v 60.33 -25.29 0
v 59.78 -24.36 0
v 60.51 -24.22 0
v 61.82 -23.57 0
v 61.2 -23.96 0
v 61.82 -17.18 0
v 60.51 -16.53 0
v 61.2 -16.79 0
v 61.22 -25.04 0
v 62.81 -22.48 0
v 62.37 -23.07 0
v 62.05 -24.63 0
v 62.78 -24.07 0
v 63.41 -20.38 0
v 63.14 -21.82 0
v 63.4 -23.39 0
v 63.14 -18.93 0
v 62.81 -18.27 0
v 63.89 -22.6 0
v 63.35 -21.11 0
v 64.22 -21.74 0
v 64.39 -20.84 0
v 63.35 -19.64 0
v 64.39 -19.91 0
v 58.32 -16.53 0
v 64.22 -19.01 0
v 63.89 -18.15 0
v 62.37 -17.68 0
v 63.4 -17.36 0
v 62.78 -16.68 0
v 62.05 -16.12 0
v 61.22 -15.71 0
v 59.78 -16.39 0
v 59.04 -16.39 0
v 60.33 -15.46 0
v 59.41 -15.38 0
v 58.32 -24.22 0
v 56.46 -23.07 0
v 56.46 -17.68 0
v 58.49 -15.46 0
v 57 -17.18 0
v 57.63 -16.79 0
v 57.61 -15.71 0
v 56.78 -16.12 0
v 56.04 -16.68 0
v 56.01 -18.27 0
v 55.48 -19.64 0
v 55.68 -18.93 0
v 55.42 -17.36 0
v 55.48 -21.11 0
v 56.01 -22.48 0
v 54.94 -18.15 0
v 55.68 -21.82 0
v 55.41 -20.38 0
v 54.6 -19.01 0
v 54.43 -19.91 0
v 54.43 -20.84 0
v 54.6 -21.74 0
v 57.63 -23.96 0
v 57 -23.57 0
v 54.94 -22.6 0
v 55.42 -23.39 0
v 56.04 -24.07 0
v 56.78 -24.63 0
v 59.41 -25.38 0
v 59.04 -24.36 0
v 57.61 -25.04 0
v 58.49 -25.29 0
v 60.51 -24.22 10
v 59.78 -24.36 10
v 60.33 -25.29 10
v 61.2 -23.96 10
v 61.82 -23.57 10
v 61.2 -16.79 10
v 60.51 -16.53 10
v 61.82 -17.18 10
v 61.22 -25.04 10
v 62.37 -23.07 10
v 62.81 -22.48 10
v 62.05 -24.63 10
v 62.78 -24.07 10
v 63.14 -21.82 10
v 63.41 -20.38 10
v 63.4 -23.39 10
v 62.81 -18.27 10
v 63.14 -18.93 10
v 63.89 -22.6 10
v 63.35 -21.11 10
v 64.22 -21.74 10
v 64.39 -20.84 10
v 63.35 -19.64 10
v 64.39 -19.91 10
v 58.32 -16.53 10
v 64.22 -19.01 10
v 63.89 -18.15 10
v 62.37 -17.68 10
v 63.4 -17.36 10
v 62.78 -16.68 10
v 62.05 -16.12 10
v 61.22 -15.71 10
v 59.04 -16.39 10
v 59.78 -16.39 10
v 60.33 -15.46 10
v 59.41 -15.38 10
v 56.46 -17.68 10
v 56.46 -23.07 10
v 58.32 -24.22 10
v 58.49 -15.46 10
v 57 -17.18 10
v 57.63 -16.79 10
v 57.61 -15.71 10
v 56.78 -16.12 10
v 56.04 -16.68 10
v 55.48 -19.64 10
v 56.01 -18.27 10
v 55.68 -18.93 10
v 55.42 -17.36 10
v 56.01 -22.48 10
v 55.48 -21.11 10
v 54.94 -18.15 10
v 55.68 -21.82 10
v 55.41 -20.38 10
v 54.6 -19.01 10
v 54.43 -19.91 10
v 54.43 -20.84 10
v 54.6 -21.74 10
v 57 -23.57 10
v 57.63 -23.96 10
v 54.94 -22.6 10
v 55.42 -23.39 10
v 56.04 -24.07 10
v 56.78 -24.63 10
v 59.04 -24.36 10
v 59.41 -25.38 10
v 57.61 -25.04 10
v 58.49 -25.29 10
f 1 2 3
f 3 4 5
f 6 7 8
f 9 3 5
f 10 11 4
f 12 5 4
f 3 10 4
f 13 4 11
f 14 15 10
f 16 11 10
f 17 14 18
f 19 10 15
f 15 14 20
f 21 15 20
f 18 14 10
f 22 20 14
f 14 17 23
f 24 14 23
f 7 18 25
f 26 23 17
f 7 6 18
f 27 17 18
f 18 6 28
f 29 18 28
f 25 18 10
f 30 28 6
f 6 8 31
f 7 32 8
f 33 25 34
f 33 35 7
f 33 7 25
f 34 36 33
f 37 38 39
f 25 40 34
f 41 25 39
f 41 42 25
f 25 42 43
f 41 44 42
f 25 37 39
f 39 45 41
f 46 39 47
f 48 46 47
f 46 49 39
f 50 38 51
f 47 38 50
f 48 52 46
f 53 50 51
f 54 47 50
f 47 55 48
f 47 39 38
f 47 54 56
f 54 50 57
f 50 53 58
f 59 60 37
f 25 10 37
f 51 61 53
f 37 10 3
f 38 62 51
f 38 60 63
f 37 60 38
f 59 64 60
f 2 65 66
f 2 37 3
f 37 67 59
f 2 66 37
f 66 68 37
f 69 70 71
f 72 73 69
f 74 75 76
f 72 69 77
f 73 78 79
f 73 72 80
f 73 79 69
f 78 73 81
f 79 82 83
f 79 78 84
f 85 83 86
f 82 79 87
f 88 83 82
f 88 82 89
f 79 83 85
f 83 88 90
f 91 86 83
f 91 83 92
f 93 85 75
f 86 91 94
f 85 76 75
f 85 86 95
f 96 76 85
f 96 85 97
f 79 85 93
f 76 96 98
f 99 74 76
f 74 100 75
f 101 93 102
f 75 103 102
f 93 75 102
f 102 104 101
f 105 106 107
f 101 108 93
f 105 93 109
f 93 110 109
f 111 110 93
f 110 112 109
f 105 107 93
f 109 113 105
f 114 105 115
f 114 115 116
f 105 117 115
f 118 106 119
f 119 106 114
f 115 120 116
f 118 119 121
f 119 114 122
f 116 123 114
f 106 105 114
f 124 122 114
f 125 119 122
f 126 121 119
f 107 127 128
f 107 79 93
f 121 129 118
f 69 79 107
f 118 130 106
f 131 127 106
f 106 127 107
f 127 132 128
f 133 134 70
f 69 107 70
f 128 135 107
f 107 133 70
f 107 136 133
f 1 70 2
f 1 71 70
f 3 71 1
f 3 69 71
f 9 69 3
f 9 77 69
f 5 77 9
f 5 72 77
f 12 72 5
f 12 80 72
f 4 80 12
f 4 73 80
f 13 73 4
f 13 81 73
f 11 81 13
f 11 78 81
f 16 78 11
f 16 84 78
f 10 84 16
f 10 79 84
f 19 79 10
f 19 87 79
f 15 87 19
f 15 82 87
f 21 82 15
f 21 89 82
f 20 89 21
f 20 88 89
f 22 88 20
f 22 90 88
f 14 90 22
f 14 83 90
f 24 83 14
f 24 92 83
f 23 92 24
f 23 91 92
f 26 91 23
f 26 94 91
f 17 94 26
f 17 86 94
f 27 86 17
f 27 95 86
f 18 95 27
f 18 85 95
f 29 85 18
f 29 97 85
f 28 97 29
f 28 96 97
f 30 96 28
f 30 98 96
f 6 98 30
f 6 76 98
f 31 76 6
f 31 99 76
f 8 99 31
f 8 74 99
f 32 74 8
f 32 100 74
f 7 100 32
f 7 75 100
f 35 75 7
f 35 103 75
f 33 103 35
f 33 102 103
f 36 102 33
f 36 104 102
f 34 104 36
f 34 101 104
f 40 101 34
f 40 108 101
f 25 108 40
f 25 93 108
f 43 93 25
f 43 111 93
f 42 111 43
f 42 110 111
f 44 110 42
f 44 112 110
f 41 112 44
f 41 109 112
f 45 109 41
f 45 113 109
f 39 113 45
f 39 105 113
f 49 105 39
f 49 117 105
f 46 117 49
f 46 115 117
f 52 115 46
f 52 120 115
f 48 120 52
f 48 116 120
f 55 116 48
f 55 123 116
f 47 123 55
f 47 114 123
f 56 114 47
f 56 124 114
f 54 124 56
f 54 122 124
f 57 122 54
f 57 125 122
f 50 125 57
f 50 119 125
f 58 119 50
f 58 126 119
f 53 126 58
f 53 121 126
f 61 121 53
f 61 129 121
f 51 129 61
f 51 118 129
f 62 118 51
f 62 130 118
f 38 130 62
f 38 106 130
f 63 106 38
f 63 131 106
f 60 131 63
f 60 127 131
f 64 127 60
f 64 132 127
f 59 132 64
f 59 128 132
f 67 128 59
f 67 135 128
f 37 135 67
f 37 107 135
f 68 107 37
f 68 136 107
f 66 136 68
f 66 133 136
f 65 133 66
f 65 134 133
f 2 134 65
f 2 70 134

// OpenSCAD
linear_extrude(height = 10, center = false) {

polygon(points=[[59.41,-15.38],[59.78,-16.39],[60.33,-15.46],[60.51,-16.53],[61.22,-15.71],[61.2,-16.79],[62.05,-16.12],[61.82,-17.18],[62.78,-16.68],[62.37,-17.68],[63.4,-17.36],[62.81,-18.27],[63.89,-18.15],[63.14,-18.93],[64.22,-19.01],[63.35,-19.64],[64.39,-19.91],[63.41,-20.38],[64.39,-20.84],[63.35,-21.11],[64.22,-21.74],[63.14,-21.82],[63.89,-22.6],[62.81,-22.48],[63.4,-23.39],[62.37,-23.07],[62.78,-24.07],[61.82,-23.57],[62.05,-24.63],[61.2,-23.96],[61.22,-25.04],[60.51,-24.22],[60.33,-25.29],[59.78,-24.36],[59.41,-25.38],[59.04,-24.36],[58.49,-25.29],[58.32,-24.22],[57.61,-25.04],[57.63,-23.96],[56.78,-24.63],[57,-23.57],[56.04,-24.07],[56.46,-23.07],[55.42,-23.39],[56.01,-22.48],[54.94,-22.6],[55.68,-21.82],[54.6,-21.74],[55.48,-21.11],[54.43,-20.84],[55.41,-20.38],[54.43,-19.91],[55.48,-19.64],[54.6,-19.01],[55.68,-18.93],[54.94,-18.15],[56.01,-18.27],[55.42,-17.36],[56.46,-17.68],[56.04,-16.68],[57,-17.18],[56.78,-16.12],[57.63,-16.79],[57.61,-15.71],[58.32,-16.53],[58.49,-15.46],[59.04,-16.39]]);

}
